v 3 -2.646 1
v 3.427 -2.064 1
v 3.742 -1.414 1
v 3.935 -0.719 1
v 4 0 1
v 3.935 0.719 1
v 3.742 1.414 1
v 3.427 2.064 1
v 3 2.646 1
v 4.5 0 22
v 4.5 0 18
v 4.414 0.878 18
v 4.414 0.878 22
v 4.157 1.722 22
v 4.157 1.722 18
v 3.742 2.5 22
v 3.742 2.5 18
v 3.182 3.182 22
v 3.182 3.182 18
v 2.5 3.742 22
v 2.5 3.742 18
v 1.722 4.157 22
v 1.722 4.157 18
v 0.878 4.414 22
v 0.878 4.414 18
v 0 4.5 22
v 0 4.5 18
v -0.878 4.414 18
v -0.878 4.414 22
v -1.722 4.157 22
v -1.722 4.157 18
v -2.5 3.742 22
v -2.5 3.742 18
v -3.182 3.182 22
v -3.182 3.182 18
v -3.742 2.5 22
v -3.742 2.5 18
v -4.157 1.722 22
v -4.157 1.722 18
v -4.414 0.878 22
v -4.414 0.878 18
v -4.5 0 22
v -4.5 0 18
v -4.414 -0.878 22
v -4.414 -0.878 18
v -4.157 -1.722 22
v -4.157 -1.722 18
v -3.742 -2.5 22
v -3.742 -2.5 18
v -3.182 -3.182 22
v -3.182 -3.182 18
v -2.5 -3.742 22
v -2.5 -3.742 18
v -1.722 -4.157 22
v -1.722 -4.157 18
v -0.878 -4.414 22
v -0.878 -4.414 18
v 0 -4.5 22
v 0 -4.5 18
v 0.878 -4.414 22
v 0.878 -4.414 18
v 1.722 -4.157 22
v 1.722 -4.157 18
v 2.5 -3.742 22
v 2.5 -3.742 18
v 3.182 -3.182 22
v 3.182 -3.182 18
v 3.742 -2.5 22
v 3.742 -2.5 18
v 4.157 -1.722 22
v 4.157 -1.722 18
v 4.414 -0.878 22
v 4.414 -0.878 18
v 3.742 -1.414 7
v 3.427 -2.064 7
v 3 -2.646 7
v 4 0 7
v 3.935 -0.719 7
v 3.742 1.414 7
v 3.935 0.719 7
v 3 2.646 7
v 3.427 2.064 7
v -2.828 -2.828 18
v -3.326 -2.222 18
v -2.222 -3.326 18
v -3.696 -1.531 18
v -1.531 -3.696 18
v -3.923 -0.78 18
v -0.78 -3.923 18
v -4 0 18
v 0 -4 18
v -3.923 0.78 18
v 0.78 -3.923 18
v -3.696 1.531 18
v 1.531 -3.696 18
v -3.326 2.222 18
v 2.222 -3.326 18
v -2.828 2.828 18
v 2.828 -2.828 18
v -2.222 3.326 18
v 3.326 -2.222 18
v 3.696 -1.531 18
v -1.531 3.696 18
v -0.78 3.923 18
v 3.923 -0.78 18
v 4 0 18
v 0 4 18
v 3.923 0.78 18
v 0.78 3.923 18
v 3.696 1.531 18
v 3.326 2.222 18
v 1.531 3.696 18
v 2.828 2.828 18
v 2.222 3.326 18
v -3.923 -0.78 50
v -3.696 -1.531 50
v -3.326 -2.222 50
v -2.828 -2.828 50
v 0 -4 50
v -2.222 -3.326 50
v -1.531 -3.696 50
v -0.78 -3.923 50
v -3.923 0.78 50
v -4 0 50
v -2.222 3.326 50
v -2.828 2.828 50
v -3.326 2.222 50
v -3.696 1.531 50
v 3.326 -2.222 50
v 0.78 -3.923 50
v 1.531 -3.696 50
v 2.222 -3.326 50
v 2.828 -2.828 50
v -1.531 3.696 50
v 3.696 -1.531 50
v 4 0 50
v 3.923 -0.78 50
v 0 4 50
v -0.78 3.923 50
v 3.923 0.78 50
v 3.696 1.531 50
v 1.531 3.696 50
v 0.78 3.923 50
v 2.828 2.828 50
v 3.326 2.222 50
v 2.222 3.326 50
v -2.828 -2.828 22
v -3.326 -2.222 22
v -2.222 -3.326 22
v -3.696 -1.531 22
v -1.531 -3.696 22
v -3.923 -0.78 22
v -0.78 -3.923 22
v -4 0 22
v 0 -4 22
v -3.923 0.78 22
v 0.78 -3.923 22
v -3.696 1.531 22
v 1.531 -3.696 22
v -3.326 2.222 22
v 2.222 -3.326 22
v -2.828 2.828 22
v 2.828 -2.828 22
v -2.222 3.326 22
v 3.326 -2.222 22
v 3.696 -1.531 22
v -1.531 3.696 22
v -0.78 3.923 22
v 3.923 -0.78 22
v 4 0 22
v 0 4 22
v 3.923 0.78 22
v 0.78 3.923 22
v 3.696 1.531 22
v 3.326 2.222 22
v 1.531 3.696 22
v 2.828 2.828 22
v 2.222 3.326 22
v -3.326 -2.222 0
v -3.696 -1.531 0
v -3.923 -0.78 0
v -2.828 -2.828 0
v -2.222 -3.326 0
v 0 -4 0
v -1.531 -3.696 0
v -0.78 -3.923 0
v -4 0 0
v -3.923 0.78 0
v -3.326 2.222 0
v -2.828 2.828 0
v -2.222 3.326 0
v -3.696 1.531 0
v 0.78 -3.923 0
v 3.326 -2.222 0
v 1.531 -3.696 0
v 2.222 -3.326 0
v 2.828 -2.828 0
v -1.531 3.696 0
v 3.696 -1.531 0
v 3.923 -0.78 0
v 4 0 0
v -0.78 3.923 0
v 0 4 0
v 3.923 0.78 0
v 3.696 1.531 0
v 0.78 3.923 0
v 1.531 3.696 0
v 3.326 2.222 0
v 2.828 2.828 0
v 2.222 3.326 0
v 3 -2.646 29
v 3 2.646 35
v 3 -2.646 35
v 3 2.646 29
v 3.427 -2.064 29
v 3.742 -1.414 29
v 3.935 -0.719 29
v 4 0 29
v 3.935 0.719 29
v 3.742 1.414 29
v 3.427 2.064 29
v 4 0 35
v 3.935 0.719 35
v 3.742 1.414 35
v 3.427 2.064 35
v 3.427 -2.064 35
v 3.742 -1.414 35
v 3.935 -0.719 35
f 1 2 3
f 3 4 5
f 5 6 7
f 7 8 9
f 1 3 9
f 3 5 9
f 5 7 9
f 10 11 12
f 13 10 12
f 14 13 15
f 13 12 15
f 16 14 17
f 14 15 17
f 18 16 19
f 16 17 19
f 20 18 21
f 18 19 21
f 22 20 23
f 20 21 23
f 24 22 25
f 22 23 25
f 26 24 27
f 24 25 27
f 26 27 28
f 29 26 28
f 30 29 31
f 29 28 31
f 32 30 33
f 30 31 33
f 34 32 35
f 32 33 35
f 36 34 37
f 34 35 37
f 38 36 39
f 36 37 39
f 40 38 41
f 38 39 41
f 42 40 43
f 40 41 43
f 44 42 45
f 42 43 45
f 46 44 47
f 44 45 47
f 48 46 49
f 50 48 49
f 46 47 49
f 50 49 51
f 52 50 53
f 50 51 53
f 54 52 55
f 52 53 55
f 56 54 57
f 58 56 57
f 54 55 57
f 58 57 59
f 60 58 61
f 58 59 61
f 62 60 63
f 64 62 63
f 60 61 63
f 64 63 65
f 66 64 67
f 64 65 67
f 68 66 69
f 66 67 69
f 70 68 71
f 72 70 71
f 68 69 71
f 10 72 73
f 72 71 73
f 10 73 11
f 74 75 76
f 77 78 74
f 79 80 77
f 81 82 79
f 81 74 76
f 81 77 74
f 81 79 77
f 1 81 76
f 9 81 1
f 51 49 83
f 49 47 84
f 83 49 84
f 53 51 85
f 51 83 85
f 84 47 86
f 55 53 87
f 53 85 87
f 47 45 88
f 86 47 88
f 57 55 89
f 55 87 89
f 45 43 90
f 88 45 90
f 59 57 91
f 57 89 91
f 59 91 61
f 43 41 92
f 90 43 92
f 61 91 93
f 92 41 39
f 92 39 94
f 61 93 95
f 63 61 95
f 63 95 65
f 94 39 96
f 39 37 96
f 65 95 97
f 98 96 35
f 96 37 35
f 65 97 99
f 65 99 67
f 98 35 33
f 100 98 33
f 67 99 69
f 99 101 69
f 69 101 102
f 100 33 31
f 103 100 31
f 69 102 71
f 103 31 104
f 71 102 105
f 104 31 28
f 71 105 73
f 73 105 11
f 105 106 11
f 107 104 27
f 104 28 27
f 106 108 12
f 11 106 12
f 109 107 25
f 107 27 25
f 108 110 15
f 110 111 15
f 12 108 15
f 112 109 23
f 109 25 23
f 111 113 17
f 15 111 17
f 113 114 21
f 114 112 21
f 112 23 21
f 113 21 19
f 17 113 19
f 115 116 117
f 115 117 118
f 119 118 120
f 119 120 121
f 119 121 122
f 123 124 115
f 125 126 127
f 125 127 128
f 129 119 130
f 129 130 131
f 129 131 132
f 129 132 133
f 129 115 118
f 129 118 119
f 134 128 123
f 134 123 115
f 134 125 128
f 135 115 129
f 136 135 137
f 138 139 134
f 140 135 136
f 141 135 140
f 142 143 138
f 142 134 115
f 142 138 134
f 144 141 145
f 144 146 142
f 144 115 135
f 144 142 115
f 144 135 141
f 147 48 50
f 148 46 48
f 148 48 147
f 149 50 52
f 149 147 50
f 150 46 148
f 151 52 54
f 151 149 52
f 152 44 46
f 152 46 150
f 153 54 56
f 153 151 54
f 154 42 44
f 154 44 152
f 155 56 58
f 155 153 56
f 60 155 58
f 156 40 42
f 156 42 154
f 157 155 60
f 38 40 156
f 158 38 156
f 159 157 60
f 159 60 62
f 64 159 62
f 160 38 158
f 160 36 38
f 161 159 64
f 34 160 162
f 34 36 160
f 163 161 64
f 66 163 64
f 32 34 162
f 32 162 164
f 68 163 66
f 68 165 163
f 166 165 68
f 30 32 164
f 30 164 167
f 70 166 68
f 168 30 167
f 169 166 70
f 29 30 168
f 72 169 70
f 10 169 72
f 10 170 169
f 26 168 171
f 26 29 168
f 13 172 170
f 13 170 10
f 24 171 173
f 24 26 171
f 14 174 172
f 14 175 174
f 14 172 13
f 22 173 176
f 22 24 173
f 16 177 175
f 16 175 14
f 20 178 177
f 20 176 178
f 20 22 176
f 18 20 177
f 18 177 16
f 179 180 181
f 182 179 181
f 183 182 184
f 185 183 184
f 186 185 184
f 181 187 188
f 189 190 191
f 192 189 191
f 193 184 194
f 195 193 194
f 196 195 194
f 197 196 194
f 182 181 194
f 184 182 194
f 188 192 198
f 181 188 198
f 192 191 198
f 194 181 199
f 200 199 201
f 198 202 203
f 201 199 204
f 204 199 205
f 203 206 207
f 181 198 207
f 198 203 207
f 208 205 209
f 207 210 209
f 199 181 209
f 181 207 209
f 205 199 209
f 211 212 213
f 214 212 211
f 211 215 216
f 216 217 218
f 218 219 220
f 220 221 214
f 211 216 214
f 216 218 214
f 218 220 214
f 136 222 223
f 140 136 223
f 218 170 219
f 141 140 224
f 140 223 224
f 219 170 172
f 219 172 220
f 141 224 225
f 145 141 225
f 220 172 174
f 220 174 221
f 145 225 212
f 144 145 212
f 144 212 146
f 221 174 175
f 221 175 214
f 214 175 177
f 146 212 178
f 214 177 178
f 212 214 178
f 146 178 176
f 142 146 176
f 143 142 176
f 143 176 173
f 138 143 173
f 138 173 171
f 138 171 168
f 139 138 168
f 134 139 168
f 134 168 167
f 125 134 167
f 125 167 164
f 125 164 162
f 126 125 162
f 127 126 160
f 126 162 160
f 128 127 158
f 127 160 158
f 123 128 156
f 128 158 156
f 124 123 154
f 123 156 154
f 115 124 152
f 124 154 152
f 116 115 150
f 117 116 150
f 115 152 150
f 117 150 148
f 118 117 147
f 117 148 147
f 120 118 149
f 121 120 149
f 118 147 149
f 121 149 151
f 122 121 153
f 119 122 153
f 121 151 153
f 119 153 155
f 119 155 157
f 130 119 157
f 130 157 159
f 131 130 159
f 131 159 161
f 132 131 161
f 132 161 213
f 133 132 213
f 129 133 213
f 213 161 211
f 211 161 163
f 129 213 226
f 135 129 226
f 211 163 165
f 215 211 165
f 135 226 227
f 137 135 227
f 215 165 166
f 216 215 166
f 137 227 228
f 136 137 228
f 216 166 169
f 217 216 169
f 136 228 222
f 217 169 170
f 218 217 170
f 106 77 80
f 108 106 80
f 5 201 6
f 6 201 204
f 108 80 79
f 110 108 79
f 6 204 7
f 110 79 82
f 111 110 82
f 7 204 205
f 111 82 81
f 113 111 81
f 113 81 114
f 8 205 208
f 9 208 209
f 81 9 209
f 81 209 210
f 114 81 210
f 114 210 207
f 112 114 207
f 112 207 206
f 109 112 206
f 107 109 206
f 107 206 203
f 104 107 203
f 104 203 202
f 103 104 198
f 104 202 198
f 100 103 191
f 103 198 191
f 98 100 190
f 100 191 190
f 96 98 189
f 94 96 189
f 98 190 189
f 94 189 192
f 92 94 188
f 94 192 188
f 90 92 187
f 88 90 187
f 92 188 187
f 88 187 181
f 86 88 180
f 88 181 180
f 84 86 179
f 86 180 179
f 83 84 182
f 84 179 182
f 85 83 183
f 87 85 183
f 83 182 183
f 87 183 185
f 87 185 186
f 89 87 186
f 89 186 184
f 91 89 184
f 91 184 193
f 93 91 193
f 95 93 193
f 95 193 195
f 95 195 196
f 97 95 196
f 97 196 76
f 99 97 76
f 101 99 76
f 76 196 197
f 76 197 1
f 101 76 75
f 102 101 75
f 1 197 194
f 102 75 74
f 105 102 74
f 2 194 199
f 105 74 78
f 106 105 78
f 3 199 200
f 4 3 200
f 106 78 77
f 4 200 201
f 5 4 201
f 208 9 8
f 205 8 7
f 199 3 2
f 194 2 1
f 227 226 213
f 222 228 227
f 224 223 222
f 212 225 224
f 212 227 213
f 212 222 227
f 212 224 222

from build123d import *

# Parameters (mm, degrees)
SKETCH_1_R          = 4
EXTRUDE_1_DEPTH     = 18
SKETCH_2_R          = 4.5
EXTRUDE_2_DEPTH     = 4
SKETCH_3_R          = 4
EXTRUDE_3_DEPTH     = 28
SKETCH_4_W          = 6
SKETCH_4_H          = 6
CUT_EXTRUDE_1_DEPTH = 1
SKETCH_5_W          = 6
SKETCH_5_H          = 6
CUT_EXTRUDE_2_DEPTH = 1


with BuildPart() as part:
    # 草圖1 → 填料-伸長1 (new body)
    with BuildSketch(Plane.XY):
        Circle(SKETCH_1_R)
    extrude(amount=EXTRUDE_1_DEPTH)

    # 草圖2 → 填料-伸長2 (add)
    with BuildSketch(Plane.XY.offset(18)):
        Circle(SKETCH_2_R)
    extrude(amount=EXTRUDE_2_DEPTH)

    # 草圖3 → 填料-伸長3 (add)
    with BuildSketch(Plane.XY.offset(22)):
        Circle(SKETCH_3_R)
    extrude(amount=EXTRUDE_3_DEPTH)

    # 草圖4 → 除料-伸長1 (cut)
    with BuildSketch(Plane(origin=(4, 0, 0), x_dir=(0, 0, -1), z_dir=(1, 0, 0))):
        with Locations((-32, 0)):
            Rectangle(SKETCH_4_W, SKETCH_4_H)
    extrude(amount=-CUT_EXTRUDE_1_DEPTH, mode=Mode.SUBTRACT)

    # 草圖5 → 除料-伸長2 (cut)
    with BuildSketch(Plane(origin=(4, 0, 0), x_dir=(0, 0, -1), z_dir=(1, 0, 0))):
        with Locations((-4, 0)):
            Rectangle(SKETCH_5_W, SKETCH_5_H)
    extrude(amount=-CUT_EXTRUDE_2_DEPTH, mode=Mode.SUBTRACT)


solid = part.part
